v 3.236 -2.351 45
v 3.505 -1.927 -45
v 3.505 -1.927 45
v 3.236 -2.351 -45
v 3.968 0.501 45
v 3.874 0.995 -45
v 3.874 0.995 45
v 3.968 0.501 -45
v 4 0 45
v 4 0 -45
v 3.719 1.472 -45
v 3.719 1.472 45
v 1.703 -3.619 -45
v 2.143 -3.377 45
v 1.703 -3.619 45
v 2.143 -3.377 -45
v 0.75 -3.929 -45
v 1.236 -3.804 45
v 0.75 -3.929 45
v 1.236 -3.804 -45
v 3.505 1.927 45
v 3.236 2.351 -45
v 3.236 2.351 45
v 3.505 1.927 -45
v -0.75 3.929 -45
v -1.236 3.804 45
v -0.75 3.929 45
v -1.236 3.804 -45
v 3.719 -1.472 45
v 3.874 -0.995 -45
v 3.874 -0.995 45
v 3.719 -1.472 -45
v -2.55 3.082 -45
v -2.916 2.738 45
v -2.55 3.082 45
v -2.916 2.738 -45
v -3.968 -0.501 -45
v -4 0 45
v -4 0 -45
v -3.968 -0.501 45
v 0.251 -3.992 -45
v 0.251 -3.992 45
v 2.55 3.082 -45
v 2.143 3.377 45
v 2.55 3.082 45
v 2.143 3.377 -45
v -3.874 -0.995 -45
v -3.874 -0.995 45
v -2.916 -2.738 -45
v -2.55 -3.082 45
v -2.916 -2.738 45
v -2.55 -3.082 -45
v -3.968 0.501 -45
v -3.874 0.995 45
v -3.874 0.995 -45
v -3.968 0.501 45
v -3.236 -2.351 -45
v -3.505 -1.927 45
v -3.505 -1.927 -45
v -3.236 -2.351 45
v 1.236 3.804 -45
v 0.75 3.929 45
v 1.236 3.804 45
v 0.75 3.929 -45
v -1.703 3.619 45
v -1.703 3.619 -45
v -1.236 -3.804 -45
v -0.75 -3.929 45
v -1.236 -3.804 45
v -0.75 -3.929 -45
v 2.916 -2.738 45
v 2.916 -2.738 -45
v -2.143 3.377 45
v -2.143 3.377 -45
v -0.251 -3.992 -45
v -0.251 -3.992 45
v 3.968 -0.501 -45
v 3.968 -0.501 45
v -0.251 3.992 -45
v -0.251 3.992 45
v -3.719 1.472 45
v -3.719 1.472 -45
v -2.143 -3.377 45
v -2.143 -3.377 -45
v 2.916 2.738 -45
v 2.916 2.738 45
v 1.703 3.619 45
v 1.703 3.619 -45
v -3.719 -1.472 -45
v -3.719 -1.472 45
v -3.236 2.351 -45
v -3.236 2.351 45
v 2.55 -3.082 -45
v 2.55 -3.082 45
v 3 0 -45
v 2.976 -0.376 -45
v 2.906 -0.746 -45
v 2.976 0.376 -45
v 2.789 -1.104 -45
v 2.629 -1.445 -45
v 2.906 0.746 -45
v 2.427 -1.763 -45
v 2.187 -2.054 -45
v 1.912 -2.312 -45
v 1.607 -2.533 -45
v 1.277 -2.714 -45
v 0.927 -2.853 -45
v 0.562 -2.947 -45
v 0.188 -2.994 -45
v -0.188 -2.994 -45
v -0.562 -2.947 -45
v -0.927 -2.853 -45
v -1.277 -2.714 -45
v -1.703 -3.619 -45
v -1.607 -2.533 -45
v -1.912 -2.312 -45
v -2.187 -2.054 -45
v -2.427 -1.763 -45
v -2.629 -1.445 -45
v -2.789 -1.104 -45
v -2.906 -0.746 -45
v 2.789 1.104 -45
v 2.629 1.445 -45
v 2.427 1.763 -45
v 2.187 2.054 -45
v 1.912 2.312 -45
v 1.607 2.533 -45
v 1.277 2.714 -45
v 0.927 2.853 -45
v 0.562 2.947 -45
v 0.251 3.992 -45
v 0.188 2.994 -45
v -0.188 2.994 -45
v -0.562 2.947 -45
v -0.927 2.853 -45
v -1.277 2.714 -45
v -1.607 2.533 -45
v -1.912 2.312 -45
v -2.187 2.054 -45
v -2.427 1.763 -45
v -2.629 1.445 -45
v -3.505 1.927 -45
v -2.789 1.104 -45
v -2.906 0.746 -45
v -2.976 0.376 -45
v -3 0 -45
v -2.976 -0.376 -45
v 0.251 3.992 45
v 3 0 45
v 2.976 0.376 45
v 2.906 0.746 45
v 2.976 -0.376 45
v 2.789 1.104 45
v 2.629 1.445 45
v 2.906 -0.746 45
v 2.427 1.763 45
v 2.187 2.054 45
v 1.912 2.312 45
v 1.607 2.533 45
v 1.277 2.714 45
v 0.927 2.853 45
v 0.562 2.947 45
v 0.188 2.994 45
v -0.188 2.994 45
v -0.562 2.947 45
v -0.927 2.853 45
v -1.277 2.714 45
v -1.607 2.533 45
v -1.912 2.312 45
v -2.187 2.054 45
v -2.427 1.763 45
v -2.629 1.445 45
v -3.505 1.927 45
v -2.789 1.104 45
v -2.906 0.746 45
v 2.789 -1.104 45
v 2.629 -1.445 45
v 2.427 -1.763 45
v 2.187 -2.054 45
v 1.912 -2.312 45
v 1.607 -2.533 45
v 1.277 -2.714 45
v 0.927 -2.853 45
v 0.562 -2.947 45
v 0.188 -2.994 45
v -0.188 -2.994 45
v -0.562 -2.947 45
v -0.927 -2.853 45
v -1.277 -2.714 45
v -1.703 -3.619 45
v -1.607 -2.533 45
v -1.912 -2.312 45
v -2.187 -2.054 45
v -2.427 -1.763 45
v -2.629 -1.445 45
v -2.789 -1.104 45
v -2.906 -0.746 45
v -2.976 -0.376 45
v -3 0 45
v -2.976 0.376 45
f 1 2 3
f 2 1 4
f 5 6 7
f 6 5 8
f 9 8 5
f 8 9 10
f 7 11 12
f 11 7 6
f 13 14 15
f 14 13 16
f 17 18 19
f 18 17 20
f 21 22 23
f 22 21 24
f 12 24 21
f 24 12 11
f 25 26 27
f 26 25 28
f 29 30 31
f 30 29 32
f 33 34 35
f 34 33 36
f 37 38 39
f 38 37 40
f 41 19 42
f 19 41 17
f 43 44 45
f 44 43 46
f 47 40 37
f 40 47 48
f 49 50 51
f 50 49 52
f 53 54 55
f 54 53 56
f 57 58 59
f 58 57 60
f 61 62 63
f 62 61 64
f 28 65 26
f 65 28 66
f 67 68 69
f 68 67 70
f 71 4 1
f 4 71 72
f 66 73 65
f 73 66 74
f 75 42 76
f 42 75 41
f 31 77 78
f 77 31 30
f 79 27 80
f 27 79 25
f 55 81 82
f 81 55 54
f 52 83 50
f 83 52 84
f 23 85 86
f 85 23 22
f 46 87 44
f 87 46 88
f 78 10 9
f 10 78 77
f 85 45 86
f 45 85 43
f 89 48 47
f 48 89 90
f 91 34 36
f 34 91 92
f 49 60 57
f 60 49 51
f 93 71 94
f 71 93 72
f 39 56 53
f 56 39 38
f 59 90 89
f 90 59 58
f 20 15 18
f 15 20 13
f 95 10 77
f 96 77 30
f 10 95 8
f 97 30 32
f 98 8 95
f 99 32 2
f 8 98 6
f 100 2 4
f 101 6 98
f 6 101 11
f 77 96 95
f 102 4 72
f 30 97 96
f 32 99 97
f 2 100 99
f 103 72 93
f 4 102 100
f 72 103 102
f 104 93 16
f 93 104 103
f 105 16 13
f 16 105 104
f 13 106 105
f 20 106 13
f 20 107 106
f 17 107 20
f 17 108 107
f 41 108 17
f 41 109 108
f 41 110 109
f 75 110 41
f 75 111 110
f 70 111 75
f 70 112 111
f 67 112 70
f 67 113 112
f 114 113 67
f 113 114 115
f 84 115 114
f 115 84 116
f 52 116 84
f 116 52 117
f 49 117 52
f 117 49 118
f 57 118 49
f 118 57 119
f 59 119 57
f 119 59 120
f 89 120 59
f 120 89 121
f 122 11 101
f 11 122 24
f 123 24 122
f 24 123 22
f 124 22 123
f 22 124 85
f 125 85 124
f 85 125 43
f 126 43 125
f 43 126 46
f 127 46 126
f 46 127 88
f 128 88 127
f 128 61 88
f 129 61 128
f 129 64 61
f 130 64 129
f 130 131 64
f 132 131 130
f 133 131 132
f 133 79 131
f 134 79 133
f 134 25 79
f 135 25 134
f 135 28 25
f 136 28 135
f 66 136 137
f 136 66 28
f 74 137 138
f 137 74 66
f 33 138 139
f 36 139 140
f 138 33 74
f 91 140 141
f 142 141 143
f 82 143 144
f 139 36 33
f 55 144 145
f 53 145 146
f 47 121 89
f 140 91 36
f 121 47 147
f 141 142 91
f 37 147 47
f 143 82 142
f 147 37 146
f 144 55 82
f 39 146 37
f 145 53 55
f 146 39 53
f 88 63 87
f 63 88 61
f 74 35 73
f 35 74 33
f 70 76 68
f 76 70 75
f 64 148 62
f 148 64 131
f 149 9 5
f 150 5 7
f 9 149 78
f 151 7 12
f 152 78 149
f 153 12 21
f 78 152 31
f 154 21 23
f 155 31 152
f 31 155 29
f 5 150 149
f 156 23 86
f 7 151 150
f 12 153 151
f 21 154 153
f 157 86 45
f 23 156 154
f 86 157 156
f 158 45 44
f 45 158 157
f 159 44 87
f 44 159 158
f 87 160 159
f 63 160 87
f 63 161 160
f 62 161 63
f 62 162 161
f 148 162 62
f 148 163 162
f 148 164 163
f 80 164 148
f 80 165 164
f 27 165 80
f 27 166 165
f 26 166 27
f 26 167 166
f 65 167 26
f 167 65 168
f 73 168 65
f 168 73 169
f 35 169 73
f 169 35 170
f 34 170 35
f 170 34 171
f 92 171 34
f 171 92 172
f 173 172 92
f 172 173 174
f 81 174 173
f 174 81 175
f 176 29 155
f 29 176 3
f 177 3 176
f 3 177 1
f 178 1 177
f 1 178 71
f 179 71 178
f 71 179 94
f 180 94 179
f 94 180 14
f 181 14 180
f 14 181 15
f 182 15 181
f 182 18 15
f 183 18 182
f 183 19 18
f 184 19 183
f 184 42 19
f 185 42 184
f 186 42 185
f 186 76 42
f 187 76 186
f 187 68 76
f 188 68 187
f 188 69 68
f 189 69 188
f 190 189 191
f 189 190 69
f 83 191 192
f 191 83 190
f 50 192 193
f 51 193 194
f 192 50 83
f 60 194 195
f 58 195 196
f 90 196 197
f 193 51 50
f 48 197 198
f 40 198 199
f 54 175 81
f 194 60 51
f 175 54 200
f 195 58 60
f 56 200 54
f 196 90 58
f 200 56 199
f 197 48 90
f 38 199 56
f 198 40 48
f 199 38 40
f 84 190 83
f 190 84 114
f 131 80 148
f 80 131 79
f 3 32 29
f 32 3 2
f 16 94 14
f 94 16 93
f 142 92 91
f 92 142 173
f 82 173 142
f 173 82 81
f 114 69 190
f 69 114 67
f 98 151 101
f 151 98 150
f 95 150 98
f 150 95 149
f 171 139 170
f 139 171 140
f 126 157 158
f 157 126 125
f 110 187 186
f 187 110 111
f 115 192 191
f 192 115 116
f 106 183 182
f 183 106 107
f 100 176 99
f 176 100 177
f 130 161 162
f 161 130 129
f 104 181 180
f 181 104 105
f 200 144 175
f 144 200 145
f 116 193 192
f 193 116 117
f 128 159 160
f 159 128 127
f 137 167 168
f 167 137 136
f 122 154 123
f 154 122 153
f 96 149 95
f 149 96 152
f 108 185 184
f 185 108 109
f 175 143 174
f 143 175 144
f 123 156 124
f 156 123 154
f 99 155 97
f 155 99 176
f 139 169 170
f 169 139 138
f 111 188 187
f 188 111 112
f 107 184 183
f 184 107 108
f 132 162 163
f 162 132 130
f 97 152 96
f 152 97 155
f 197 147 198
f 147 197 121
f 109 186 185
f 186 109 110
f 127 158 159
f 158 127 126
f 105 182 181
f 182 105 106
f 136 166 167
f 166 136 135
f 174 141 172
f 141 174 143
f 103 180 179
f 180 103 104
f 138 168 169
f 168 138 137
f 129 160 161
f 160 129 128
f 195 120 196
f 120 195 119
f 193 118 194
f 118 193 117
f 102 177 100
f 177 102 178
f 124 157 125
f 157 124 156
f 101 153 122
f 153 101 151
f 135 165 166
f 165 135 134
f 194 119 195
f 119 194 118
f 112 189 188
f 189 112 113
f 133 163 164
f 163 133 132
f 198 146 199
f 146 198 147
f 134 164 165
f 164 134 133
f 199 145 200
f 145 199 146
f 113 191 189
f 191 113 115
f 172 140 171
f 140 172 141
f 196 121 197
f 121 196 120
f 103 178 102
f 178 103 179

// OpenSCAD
$fn = 50;


difference() {
	union() {
		translate(v = [0, 0, -45.0000000000]) {
			cylinder(h = 90, r = 4.0000000000);
		}
	}
	union() {
		translate(v = [0, 0, -100.0000000000]) {
			cylinder(h = 200, r = 3.0000000000);
		}
	}
}
